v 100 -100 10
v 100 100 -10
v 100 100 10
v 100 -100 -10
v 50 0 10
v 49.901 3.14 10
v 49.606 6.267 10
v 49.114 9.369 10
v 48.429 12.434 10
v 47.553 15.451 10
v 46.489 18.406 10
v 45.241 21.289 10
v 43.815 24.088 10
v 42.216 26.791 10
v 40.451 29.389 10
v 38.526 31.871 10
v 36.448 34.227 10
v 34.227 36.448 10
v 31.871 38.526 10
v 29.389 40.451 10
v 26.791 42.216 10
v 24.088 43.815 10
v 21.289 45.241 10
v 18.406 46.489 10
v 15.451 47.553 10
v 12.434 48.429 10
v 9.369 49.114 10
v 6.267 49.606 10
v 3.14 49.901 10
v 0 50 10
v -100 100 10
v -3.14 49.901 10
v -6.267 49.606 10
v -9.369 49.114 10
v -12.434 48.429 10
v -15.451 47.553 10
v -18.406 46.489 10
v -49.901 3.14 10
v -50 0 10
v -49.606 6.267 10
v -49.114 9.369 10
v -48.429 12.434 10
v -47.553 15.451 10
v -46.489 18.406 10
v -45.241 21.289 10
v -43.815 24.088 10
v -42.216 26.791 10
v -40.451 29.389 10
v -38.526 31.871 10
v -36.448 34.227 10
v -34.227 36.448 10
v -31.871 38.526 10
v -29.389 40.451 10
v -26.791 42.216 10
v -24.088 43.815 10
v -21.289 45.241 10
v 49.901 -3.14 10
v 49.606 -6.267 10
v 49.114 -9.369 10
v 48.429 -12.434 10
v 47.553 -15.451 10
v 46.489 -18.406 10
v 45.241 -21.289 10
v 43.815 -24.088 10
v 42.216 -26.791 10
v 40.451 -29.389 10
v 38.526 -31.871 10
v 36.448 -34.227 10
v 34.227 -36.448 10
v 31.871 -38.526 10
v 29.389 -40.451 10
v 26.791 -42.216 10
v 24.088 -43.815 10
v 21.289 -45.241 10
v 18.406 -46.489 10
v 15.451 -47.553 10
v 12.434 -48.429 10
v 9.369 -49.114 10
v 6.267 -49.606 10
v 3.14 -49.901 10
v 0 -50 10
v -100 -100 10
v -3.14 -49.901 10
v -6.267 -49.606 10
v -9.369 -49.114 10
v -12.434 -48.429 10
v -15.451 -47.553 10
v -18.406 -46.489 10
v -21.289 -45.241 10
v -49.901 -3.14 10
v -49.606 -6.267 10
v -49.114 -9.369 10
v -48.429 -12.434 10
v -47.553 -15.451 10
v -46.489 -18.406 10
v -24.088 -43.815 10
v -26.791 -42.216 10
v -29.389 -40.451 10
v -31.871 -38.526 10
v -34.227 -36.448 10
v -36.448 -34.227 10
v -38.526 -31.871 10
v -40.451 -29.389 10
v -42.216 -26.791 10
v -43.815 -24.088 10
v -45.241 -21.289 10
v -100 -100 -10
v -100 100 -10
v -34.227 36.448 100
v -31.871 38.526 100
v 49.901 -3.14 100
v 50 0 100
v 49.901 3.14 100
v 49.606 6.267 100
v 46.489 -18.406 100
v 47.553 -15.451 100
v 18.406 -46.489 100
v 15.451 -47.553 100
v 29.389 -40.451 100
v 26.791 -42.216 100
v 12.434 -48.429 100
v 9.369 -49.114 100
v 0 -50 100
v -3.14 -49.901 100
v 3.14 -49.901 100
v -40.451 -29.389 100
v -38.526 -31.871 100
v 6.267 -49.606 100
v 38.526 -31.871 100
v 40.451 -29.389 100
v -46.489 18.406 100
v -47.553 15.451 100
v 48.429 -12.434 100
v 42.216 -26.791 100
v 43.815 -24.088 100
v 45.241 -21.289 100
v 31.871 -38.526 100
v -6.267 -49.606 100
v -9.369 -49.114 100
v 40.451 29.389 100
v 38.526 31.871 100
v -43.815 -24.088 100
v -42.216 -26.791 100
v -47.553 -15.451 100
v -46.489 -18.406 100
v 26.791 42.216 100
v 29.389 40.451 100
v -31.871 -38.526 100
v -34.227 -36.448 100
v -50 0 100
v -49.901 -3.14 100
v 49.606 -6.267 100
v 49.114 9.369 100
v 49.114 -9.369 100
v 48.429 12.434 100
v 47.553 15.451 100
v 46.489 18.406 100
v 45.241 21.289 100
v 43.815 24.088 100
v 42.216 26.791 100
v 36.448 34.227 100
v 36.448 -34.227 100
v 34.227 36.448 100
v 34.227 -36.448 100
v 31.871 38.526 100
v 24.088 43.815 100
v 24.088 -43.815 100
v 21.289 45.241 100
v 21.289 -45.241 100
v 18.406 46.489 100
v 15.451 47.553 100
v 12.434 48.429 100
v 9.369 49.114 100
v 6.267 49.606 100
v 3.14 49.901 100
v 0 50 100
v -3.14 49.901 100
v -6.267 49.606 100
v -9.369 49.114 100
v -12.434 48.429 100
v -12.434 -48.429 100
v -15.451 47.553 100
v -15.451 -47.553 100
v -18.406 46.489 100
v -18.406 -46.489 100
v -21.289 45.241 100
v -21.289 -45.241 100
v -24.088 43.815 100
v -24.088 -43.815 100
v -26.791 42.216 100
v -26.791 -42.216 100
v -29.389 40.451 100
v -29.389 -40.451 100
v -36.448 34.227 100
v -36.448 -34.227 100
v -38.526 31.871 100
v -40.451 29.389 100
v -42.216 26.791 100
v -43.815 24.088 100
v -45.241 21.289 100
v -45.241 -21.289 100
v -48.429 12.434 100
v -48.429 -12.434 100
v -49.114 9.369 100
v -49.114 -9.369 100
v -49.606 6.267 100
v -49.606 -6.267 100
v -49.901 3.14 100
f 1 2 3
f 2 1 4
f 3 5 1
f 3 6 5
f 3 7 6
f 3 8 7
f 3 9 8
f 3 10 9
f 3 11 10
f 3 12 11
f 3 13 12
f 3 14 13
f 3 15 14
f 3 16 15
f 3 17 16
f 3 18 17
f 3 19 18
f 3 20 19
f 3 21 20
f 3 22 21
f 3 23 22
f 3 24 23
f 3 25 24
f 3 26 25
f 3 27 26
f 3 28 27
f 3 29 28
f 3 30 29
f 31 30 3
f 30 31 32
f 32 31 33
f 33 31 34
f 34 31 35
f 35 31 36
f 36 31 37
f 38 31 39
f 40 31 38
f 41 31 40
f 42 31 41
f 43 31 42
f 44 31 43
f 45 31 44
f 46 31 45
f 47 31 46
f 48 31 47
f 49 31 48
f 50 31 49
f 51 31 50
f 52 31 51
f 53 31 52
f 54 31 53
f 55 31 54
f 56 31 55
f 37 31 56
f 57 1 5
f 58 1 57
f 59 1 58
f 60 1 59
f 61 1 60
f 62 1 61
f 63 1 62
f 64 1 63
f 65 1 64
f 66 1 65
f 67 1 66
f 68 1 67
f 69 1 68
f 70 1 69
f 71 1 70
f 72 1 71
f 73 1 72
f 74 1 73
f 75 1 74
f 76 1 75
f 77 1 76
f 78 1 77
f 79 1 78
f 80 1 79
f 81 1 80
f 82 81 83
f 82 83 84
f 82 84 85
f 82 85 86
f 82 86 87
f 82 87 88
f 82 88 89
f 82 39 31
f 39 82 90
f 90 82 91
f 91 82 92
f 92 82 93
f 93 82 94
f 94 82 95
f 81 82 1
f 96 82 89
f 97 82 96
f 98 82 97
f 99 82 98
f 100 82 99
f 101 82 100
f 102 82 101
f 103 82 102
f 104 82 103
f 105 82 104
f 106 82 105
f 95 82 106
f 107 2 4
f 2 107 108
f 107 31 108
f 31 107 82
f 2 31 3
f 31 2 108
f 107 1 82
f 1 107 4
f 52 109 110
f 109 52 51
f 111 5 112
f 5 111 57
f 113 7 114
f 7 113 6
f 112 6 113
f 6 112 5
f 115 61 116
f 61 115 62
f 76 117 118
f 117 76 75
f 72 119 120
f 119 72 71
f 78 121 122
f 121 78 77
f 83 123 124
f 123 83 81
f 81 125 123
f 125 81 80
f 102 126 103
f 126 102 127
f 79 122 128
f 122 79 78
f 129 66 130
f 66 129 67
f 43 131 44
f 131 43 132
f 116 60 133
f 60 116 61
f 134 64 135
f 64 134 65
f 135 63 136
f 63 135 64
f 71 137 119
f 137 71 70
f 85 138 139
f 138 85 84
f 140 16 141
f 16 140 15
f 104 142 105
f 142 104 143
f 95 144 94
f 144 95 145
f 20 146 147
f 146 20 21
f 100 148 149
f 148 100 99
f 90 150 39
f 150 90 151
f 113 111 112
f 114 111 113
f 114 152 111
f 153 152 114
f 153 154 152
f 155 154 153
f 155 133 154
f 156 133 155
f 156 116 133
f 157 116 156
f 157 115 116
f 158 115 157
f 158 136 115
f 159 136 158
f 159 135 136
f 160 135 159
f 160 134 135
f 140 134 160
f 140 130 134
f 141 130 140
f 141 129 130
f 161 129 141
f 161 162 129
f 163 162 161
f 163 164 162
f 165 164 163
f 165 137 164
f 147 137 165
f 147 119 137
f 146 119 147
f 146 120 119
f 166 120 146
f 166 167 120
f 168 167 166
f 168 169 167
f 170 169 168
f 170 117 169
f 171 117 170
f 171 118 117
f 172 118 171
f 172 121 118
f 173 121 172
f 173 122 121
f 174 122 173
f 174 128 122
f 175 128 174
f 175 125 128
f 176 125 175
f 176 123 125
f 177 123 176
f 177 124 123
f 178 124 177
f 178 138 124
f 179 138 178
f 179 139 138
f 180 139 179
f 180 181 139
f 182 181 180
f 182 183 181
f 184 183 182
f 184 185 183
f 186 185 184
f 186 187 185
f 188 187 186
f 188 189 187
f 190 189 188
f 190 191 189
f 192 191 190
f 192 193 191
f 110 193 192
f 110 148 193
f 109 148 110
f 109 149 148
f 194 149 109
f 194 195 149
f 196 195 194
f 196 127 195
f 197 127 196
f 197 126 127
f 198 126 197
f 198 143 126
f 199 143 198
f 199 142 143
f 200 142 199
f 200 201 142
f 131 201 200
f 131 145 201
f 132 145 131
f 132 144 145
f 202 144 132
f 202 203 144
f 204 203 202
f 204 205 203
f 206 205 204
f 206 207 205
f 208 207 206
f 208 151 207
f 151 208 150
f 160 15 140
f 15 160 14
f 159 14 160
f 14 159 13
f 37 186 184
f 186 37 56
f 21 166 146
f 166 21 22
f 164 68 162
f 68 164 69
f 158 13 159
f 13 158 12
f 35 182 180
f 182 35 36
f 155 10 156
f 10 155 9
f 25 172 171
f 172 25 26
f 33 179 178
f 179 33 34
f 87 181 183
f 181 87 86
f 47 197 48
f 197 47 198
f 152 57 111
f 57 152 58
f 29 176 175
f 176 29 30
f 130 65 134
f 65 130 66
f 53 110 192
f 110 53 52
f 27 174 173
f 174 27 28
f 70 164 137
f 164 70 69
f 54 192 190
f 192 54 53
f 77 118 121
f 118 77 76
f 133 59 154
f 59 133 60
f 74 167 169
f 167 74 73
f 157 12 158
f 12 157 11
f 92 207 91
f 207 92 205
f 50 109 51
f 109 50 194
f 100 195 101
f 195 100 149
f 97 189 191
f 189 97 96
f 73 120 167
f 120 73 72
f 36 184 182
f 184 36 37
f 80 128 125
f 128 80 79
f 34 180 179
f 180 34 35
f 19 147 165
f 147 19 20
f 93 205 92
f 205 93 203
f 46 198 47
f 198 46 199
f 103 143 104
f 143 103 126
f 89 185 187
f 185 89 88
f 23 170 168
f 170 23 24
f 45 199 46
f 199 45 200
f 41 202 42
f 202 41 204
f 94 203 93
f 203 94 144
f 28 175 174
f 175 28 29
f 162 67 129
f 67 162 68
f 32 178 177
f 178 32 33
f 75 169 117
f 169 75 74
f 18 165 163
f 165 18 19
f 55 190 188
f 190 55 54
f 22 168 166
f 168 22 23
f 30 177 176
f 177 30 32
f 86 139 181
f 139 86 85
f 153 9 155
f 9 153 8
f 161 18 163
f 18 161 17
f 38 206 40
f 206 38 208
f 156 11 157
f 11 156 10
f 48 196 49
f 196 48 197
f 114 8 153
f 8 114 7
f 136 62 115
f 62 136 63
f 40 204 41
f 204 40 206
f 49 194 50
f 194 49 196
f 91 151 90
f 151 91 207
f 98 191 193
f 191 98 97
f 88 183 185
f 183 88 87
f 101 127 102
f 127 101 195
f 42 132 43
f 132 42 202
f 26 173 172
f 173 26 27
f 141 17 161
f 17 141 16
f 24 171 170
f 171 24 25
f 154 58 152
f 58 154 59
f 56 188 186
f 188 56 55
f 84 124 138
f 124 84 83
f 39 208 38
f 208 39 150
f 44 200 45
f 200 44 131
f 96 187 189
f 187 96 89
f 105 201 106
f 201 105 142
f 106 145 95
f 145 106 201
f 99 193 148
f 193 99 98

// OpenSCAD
union(){cube(size=[200.0000,200.0000,20.0000],center=true);cylinder(h=100.0000,d=100.0000,$fn=100);}
